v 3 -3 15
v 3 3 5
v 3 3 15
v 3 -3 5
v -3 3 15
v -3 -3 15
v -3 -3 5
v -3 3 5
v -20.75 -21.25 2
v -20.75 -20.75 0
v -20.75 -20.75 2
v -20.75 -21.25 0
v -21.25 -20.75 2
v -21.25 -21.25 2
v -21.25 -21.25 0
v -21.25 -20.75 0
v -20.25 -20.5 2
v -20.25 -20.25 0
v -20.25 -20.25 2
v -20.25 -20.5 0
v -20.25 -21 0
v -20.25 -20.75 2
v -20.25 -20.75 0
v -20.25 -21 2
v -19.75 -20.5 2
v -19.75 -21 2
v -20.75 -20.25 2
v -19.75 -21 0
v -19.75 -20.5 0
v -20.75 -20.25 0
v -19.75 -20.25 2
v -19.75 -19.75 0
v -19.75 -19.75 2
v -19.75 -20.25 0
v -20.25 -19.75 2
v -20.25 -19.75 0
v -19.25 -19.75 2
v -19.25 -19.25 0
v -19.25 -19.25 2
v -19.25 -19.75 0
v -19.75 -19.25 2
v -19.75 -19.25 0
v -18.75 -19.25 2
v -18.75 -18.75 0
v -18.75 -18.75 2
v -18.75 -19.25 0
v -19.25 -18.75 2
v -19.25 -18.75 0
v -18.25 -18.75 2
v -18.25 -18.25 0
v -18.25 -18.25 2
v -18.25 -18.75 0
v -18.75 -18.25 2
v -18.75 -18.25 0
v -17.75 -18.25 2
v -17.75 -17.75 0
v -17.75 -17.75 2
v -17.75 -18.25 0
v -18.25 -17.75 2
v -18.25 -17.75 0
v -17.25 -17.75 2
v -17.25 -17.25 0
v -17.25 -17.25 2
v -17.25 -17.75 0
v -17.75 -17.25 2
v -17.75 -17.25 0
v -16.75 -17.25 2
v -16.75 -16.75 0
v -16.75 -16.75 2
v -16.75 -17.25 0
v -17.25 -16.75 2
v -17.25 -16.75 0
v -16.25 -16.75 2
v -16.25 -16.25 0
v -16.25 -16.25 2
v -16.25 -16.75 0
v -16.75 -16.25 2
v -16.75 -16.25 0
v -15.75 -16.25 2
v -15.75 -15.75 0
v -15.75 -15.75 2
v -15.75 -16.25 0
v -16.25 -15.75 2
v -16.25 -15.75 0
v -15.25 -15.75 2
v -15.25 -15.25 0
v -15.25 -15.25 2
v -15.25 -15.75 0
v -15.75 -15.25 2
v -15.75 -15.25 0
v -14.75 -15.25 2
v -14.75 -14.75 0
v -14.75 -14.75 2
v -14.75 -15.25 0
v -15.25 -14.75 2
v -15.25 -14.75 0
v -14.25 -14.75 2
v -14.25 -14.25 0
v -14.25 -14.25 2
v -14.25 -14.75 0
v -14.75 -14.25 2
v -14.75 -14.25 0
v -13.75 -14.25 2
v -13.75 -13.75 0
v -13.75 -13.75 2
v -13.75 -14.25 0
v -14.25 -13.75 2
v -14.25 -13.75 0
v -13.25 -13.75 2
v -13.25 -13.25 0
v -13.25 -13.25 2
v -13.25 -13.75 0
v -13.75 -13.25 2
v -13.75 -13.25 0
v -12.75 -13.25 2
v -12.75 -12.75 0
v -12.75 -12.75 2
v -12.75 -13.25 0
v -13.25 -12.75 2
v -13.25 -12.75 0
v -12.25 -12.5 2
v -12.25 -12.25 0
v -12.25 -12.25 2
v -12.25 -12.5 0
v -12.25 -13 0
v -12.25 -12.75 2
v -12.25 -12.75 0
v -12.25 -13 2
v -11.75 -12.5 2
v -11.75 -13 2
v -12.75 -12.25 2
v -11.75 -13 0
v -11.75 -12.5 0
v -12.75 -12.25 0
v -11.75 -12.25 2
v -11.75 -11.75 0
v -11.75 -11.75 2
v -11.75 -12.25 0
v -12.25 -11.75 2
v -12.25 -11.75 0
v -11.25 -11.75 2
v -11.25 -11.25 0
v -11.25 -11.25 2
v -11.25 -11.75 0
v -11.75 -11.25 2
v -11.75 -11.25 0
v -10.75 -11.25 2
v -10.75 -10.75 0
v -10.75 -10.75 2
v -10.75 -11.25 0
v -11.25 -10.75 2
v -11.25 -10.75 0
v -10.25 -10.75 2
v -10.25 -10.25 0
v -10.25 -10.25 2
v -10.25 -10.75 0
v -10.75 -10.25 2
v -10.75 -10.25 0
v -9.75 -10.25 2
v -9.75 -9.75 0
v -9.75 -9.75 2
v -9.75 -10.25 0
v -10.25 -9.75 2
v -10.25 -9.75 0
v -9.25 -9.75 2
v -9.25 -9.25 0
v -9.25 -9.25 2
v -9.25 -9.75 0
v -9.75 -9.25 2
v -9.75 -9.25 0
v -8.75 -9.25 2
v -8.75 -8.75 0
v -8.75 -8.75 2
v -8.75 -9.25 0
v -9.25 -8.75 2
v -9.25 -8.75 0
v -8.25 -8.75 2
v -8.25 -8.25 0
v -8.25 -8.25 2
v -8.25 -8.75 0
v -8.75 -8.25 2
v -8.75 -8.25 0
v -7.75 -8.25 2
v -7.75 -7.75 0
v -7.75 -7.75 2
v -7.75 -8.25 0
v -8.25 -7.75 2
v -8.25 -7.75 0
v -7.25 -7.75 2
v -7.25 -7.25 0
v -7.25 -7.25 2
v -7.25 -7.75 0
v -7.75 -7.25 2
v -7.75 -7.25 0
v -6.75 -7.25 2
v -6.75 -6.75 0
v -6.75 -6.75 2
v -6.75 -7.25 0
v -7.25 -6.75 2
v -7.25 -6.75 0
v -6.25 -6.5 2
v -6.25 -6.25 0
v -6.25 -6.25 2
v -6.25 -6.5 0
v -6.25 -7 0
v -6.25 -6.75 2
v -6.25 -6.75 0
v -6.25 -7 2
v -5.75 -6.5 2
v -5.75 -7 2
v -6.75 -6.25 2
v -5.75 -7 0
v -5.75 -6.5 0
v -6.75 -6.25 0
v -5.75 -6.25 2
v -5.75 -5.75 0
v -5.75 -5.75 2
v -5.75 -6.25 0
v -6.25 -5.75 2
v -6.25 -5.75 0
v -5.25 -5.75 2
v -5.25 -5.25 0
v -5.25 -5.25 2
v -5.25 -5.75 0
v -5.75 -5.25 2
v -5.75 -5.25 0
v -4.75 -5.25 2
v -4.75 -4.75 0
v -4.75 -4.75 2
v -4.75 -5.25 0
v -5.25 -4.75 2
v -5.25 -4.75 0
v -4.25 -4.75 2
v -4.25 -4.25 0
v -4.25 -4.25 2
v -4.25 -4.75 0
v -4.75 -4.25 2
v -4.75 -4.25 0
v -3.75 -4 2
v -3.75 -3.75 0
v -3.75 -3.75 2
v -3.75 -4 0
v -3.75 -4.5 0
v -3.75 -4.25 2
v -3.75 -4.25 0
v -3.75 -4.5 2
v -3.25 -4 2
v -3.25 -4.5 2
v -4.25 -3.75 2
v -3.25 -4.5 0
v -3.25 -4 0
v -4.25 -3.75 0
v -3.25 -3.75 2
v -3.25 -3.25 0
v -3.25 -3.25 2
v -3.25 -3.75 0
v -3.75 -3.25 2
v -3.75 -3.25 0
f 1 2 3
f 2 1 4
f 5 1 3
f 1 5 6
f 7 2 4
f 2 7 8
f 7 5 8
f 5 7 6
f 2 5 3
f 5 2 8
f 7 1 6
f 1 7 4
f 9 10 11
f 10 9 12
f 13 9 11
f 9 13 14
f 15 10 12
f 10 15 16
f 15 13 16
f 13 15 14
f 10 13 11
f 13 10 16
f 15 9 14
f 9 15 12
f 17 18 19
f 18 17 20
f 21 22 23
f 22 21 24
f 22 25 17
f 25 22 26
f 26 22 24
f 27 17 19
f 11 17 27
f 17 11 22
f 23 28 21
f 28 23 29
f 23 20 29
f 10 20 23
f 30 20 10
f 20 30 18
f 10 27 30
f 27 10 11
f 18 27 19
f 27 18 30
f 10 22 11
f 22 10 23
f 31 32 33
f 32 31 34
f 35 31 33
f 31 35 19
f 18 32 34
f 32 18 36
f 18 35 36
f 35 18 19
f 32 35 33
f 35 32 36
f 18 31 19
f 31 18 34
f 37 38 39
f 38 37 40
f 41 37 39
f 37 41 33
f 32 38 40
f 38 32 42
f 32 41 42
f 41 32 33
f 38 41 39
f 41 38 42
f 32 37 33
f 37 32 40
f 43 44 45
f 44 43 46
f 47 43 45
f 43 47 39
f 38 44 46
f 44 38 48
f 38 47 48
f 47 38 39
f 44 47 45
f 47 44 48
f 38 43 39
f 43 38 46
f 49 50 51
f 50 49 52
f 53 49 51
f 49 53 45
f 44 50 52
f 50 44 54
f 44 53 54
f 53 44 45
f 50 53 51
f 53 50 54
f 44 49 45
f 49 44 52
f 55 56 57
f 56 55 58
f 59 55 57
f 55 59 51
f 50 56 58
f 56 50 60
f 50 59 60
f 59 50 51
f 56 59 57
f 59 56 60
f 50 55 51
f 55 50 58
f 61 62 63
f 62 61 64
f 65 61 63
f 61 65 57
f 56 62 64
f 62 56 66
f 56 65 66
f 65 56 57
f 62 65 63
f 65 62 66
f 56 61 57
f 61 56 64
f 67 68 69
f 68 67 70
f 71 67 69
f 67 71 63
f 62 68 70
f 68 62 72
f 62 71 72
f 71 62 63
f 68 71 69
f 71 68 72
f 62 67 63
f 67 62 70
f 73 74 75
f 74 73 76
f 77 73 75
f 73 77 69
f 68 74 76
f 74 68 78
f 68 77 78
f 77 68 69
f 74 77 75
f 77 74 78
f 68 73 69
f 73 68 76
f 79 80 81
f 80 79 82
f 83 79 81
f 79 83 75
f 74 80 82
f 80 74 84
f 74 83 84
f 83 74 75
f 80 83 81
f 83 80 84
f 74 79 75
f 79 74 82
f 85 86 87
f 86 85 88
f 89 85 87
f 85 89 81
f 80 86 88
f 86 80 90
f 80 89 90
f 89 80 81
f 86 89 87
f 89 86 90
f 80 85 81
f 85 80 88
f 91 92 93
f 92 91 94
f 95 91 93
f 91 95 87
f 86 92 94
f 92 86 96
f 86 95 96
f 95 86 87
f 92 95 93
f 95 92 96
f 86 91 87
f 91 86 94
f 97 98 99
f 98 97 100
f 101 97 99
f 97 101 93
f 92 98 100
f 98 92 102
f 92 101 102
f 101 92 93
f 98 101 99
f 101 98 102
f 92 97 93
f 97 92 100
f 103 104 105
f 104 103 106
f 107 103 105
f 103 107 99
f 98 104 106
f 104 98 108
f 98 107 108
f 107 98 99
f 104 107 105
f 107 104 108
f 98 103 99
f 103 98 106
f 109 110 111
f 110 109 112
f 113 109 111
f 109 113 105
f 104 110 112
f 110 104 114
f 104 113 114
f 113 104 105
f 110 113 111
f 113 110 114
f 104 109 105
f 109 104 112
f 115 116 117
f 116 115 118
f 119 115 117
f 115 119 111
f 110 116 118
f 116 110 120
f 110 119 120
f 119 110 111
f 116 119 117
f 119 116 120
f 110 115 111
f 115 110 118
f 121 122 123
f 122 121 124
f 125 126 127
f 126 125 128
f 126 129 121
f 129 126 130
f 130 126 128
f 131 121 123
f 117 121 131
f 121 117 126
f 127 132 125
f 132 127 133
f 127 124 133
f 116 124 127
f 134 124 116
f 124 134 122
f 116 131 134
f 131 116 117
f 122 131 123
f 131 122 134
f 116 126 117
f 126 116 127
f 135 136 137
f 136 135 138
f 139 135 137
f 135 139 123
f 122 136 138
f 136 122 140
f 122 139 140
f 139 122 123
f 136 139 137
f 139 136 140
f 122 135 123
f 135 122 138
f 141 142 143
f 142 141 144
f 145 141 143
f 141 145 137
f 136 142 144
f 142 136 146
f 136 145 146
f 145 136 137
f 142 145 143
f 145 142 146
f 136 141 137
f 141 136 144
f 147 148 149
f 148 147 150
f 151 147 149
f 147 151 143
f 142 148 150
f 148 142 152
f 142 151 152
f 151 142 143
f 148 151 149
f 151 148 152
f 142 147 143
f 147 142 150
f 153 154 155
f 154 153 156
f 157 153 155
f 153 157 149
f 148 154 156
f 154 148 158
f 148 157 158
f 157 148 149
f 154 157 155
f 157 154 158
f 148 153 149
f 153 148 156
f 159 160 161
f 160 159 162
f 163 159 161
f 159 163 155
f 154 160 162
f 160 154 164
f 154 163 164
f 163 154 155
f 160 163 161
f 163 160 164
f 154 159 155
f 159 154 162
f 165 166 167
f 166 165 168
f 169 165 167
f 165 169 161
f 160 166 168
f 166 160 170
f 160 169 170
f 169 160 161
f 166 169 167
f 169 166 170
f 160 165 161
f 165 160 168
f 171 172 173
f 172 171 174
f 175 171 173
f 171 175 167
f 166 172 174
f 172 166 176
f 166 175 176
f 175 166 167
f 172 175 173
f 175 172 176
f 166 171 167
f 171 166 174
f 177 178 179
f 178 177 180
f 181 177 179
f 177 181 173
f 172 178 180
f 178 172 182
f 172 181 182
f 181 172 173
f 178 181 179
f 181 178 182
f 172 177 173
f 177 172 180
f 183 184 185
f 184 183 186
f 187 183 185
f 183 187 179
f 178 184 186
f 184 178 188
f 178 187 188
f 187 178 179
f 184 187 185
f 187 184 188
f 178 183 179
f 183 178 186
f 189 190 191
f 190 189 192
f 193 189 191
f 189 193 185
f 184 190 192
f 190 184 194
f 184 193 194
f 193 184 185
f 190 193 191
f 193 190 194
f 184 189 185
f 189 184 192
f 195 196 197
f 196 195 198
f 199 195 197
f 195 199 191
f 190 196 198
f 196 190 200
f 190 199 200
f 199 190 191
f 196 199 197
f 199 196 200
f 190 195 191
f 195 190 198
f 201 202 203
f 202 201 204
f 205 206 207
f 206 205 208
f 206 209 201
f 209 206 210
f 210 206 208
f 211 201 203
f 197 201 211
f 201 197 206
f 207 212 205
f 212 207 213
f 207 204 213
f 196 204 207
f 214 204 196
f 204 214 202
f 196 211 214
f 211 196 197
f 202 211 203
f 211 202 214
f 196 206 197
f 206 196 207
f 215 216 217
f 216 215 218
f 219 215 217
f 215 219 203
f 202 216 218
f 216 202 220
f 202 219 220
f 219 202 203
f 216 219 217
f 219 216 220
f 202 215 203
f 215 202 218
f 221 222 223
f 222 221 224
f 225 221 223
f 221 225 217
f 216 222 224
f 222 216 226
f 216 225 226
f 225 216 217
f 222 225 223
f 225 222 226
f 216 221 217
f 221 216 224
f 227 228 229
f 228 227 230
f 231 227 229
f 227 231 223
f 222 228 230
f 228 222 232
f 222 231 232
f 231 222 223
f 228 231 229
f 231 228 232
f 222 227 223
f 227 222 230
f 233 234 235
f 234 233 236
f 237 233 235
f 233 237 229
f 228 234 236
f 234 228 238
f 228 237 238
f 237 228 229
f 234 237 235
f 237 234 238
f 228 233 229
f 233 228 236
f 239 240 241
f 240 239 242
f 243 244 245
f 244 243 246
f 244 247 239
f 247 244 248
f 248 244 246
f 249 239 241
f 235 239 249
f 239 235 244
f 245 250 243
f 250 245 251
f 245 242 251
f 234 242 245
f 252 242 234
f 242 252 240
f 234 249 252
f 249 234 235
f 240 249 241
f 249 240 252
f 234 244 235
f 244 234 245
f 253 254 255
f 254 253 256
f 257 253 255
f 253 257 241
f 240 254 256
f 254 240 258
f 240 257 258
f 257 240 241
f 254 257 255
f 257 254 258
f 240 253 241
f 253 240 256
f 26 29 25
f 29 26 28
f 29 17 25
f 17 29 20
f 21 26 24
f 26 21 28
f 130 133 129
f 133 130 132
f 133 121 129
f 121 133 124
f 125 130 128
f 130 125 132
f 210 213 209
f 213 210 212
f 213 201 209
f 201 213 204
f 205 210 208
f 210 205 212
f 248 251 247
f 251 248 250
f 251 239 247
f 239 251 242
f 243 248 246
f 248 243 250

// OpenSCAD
translate([0, 0, 10]) color([0,1,0,0.9]) cube([6, 6, 10], center=true);
translate([-21.0, -21.0, 1]) color([1,0,0]) cube([0.5, 0.5, 2], center=true);
translate([-20.5, -20.5, 1]) color([1,0,0]) cube([0.5, 0.5, 2], center=true);
translate([-20.0, -20.0, 1]) color([1,0,0]) cube([0.5, 0.5, 2], center=true);
translate([-19.5, -19.5, 1]) color([1,0,0]) cube([0.5, 0.5, 2], center=true);
translate([-19.0, -19.0, 1]) color([1,0,0]) cube([0.5, 0.5, 2], center=true);
translate([-18.5, -18.5, 1]) color([1,0,0]) cube([0.5, 0.5, 2], center=true);
translate([-18.0, -18.0, 1]) color([1,0,0]) cube([0.5, 0.5, 2], center=true);
translate([-17.5, -17.5, 1]) color([1,0,0]) cube([0.5, 0.5, 2], center=true);
translate([-17.0, -17.0, 1]) color([1,0,0]) cube([0.5, 0.5, 2], center=true);
translate([-16.5, -16.5, 1]) color([1,0,0]) cube([0.5, 0.5, 2], center=true);
translate([-16.0, -16.0, 1]) color([1,0,0]) cube([0.5, 0.5, 2], center=true);
translate([-15.5, -15.5, 1]) color([1,0,0]) cube([0.5, 0.5, 2], center=true);
translate([-15.0, -15.0, 1]) color([1,0,0]) cube([0.5, 0.5, 2], center=true);
translate([-14.5, -14.5, 1]) color([1,0,0]) cube([0.5, 0.5, 2], center=true);
translate([-14.0, -14.0, 1]) color([1,0,0]) cube([0.5, 0.5, 2], center=true);
translate([-13.5, -13.5, 1]) color([1,0,0]) cube([0.5, 0.5, 2], center=true);
translate([-13.0, -13.0, 1]) color([1,0,0]) cube([0.5, 0.5, 2], center=true);
translate([-12.5, -12.5, 1]) color([1,0,0]) cube([0.5, 0.5, 2], center=true);
translate([-12.0, -12.0, 1]) color([1,0,0]) cube([0.5, 0.5, 2], center=true);
translate([-11.5, -11.5, 1]) color([1,0,0]) cube([0.5, 0.5, 2], center=true);
translate([-11.0, -11.0, 1]) color([1,0,0]) cube([0.5, 0.5, 2], center=true);
translate([-10.5, -10.5, 1]) color([1,0,0]) cube([0.5, 0.5, 2], center=true);
translate([-10.0, -10.0, 1]) color([1,0,0]) cube([0.5, 0.5, 2], center=true);
translate([-9.5, -9.5, 1]) color([1,0,0]) cube([0.5, 0.5, 2], center=true);
translate([-9.0, -9.0, 1]) color([1,0,0]) cube([0.5, 0.5, 2], center=true);
translate([-8.5, -8.5, 1]) color([1,0,0]) cube([0.5, 0.5, 2], center=true);
translate([-8.0, -8.0, 1]) color([1,0,0]) cube([0.5, 0.5, 2], center=true);
translate([-7.5, -7.5, 1]) color([1,0,0]) cube([0.5, 0.5, 2], center=true);
translate([-7.0, -7.0, 1]) color([1,0,0]) cube([0.5, 0.5, 2], center=true);
translate([-6.5, -6.5, 1]) color([1,0,0]) cube([0.5, 0.5, 2], center=true);
translate([-6.0, -6.0, 1]) color([1,0,0]) cube([0.5, 0.5, 2], center=true);
translate([-5.5, -5.5, 1]) color([1,0,0]) cube([0.5, 0.5, 2], center=true);
translate([-5.0, -5.0, 1]) color([1,0,0]) cube([0.5, 0.5, 2], center=true);
translate([-4.5, -4.5, 1]) color([1,0,0]) cube([0.5, 0.5, 2], center=true);
translate([-4.0, -4.0, 1]) color([1,0,0]) cube([0.5, 0.5, 2], center=true);
translate([-3.5, -3.5, 1]) color([1,0,0]) cube([0.5, 0.5, 2], center=true);
translate([-20.0, -20.75, 1]) color([1,0,0]) cube([0.5, 0.5, 2], center=true);
translate([-12.0, -12.75, 1]) color([1,0,0]) cube([0.5, 0.5, 2], center=true);
translate([-6.0, -6.75, 1]) color([1,0,0]) cube([0.5, 0.5, 2], center=true);
translate([-3.5, -4.25, 1]) color([1,0,0]) cube([0.5, 0.5, 2], center=true);
